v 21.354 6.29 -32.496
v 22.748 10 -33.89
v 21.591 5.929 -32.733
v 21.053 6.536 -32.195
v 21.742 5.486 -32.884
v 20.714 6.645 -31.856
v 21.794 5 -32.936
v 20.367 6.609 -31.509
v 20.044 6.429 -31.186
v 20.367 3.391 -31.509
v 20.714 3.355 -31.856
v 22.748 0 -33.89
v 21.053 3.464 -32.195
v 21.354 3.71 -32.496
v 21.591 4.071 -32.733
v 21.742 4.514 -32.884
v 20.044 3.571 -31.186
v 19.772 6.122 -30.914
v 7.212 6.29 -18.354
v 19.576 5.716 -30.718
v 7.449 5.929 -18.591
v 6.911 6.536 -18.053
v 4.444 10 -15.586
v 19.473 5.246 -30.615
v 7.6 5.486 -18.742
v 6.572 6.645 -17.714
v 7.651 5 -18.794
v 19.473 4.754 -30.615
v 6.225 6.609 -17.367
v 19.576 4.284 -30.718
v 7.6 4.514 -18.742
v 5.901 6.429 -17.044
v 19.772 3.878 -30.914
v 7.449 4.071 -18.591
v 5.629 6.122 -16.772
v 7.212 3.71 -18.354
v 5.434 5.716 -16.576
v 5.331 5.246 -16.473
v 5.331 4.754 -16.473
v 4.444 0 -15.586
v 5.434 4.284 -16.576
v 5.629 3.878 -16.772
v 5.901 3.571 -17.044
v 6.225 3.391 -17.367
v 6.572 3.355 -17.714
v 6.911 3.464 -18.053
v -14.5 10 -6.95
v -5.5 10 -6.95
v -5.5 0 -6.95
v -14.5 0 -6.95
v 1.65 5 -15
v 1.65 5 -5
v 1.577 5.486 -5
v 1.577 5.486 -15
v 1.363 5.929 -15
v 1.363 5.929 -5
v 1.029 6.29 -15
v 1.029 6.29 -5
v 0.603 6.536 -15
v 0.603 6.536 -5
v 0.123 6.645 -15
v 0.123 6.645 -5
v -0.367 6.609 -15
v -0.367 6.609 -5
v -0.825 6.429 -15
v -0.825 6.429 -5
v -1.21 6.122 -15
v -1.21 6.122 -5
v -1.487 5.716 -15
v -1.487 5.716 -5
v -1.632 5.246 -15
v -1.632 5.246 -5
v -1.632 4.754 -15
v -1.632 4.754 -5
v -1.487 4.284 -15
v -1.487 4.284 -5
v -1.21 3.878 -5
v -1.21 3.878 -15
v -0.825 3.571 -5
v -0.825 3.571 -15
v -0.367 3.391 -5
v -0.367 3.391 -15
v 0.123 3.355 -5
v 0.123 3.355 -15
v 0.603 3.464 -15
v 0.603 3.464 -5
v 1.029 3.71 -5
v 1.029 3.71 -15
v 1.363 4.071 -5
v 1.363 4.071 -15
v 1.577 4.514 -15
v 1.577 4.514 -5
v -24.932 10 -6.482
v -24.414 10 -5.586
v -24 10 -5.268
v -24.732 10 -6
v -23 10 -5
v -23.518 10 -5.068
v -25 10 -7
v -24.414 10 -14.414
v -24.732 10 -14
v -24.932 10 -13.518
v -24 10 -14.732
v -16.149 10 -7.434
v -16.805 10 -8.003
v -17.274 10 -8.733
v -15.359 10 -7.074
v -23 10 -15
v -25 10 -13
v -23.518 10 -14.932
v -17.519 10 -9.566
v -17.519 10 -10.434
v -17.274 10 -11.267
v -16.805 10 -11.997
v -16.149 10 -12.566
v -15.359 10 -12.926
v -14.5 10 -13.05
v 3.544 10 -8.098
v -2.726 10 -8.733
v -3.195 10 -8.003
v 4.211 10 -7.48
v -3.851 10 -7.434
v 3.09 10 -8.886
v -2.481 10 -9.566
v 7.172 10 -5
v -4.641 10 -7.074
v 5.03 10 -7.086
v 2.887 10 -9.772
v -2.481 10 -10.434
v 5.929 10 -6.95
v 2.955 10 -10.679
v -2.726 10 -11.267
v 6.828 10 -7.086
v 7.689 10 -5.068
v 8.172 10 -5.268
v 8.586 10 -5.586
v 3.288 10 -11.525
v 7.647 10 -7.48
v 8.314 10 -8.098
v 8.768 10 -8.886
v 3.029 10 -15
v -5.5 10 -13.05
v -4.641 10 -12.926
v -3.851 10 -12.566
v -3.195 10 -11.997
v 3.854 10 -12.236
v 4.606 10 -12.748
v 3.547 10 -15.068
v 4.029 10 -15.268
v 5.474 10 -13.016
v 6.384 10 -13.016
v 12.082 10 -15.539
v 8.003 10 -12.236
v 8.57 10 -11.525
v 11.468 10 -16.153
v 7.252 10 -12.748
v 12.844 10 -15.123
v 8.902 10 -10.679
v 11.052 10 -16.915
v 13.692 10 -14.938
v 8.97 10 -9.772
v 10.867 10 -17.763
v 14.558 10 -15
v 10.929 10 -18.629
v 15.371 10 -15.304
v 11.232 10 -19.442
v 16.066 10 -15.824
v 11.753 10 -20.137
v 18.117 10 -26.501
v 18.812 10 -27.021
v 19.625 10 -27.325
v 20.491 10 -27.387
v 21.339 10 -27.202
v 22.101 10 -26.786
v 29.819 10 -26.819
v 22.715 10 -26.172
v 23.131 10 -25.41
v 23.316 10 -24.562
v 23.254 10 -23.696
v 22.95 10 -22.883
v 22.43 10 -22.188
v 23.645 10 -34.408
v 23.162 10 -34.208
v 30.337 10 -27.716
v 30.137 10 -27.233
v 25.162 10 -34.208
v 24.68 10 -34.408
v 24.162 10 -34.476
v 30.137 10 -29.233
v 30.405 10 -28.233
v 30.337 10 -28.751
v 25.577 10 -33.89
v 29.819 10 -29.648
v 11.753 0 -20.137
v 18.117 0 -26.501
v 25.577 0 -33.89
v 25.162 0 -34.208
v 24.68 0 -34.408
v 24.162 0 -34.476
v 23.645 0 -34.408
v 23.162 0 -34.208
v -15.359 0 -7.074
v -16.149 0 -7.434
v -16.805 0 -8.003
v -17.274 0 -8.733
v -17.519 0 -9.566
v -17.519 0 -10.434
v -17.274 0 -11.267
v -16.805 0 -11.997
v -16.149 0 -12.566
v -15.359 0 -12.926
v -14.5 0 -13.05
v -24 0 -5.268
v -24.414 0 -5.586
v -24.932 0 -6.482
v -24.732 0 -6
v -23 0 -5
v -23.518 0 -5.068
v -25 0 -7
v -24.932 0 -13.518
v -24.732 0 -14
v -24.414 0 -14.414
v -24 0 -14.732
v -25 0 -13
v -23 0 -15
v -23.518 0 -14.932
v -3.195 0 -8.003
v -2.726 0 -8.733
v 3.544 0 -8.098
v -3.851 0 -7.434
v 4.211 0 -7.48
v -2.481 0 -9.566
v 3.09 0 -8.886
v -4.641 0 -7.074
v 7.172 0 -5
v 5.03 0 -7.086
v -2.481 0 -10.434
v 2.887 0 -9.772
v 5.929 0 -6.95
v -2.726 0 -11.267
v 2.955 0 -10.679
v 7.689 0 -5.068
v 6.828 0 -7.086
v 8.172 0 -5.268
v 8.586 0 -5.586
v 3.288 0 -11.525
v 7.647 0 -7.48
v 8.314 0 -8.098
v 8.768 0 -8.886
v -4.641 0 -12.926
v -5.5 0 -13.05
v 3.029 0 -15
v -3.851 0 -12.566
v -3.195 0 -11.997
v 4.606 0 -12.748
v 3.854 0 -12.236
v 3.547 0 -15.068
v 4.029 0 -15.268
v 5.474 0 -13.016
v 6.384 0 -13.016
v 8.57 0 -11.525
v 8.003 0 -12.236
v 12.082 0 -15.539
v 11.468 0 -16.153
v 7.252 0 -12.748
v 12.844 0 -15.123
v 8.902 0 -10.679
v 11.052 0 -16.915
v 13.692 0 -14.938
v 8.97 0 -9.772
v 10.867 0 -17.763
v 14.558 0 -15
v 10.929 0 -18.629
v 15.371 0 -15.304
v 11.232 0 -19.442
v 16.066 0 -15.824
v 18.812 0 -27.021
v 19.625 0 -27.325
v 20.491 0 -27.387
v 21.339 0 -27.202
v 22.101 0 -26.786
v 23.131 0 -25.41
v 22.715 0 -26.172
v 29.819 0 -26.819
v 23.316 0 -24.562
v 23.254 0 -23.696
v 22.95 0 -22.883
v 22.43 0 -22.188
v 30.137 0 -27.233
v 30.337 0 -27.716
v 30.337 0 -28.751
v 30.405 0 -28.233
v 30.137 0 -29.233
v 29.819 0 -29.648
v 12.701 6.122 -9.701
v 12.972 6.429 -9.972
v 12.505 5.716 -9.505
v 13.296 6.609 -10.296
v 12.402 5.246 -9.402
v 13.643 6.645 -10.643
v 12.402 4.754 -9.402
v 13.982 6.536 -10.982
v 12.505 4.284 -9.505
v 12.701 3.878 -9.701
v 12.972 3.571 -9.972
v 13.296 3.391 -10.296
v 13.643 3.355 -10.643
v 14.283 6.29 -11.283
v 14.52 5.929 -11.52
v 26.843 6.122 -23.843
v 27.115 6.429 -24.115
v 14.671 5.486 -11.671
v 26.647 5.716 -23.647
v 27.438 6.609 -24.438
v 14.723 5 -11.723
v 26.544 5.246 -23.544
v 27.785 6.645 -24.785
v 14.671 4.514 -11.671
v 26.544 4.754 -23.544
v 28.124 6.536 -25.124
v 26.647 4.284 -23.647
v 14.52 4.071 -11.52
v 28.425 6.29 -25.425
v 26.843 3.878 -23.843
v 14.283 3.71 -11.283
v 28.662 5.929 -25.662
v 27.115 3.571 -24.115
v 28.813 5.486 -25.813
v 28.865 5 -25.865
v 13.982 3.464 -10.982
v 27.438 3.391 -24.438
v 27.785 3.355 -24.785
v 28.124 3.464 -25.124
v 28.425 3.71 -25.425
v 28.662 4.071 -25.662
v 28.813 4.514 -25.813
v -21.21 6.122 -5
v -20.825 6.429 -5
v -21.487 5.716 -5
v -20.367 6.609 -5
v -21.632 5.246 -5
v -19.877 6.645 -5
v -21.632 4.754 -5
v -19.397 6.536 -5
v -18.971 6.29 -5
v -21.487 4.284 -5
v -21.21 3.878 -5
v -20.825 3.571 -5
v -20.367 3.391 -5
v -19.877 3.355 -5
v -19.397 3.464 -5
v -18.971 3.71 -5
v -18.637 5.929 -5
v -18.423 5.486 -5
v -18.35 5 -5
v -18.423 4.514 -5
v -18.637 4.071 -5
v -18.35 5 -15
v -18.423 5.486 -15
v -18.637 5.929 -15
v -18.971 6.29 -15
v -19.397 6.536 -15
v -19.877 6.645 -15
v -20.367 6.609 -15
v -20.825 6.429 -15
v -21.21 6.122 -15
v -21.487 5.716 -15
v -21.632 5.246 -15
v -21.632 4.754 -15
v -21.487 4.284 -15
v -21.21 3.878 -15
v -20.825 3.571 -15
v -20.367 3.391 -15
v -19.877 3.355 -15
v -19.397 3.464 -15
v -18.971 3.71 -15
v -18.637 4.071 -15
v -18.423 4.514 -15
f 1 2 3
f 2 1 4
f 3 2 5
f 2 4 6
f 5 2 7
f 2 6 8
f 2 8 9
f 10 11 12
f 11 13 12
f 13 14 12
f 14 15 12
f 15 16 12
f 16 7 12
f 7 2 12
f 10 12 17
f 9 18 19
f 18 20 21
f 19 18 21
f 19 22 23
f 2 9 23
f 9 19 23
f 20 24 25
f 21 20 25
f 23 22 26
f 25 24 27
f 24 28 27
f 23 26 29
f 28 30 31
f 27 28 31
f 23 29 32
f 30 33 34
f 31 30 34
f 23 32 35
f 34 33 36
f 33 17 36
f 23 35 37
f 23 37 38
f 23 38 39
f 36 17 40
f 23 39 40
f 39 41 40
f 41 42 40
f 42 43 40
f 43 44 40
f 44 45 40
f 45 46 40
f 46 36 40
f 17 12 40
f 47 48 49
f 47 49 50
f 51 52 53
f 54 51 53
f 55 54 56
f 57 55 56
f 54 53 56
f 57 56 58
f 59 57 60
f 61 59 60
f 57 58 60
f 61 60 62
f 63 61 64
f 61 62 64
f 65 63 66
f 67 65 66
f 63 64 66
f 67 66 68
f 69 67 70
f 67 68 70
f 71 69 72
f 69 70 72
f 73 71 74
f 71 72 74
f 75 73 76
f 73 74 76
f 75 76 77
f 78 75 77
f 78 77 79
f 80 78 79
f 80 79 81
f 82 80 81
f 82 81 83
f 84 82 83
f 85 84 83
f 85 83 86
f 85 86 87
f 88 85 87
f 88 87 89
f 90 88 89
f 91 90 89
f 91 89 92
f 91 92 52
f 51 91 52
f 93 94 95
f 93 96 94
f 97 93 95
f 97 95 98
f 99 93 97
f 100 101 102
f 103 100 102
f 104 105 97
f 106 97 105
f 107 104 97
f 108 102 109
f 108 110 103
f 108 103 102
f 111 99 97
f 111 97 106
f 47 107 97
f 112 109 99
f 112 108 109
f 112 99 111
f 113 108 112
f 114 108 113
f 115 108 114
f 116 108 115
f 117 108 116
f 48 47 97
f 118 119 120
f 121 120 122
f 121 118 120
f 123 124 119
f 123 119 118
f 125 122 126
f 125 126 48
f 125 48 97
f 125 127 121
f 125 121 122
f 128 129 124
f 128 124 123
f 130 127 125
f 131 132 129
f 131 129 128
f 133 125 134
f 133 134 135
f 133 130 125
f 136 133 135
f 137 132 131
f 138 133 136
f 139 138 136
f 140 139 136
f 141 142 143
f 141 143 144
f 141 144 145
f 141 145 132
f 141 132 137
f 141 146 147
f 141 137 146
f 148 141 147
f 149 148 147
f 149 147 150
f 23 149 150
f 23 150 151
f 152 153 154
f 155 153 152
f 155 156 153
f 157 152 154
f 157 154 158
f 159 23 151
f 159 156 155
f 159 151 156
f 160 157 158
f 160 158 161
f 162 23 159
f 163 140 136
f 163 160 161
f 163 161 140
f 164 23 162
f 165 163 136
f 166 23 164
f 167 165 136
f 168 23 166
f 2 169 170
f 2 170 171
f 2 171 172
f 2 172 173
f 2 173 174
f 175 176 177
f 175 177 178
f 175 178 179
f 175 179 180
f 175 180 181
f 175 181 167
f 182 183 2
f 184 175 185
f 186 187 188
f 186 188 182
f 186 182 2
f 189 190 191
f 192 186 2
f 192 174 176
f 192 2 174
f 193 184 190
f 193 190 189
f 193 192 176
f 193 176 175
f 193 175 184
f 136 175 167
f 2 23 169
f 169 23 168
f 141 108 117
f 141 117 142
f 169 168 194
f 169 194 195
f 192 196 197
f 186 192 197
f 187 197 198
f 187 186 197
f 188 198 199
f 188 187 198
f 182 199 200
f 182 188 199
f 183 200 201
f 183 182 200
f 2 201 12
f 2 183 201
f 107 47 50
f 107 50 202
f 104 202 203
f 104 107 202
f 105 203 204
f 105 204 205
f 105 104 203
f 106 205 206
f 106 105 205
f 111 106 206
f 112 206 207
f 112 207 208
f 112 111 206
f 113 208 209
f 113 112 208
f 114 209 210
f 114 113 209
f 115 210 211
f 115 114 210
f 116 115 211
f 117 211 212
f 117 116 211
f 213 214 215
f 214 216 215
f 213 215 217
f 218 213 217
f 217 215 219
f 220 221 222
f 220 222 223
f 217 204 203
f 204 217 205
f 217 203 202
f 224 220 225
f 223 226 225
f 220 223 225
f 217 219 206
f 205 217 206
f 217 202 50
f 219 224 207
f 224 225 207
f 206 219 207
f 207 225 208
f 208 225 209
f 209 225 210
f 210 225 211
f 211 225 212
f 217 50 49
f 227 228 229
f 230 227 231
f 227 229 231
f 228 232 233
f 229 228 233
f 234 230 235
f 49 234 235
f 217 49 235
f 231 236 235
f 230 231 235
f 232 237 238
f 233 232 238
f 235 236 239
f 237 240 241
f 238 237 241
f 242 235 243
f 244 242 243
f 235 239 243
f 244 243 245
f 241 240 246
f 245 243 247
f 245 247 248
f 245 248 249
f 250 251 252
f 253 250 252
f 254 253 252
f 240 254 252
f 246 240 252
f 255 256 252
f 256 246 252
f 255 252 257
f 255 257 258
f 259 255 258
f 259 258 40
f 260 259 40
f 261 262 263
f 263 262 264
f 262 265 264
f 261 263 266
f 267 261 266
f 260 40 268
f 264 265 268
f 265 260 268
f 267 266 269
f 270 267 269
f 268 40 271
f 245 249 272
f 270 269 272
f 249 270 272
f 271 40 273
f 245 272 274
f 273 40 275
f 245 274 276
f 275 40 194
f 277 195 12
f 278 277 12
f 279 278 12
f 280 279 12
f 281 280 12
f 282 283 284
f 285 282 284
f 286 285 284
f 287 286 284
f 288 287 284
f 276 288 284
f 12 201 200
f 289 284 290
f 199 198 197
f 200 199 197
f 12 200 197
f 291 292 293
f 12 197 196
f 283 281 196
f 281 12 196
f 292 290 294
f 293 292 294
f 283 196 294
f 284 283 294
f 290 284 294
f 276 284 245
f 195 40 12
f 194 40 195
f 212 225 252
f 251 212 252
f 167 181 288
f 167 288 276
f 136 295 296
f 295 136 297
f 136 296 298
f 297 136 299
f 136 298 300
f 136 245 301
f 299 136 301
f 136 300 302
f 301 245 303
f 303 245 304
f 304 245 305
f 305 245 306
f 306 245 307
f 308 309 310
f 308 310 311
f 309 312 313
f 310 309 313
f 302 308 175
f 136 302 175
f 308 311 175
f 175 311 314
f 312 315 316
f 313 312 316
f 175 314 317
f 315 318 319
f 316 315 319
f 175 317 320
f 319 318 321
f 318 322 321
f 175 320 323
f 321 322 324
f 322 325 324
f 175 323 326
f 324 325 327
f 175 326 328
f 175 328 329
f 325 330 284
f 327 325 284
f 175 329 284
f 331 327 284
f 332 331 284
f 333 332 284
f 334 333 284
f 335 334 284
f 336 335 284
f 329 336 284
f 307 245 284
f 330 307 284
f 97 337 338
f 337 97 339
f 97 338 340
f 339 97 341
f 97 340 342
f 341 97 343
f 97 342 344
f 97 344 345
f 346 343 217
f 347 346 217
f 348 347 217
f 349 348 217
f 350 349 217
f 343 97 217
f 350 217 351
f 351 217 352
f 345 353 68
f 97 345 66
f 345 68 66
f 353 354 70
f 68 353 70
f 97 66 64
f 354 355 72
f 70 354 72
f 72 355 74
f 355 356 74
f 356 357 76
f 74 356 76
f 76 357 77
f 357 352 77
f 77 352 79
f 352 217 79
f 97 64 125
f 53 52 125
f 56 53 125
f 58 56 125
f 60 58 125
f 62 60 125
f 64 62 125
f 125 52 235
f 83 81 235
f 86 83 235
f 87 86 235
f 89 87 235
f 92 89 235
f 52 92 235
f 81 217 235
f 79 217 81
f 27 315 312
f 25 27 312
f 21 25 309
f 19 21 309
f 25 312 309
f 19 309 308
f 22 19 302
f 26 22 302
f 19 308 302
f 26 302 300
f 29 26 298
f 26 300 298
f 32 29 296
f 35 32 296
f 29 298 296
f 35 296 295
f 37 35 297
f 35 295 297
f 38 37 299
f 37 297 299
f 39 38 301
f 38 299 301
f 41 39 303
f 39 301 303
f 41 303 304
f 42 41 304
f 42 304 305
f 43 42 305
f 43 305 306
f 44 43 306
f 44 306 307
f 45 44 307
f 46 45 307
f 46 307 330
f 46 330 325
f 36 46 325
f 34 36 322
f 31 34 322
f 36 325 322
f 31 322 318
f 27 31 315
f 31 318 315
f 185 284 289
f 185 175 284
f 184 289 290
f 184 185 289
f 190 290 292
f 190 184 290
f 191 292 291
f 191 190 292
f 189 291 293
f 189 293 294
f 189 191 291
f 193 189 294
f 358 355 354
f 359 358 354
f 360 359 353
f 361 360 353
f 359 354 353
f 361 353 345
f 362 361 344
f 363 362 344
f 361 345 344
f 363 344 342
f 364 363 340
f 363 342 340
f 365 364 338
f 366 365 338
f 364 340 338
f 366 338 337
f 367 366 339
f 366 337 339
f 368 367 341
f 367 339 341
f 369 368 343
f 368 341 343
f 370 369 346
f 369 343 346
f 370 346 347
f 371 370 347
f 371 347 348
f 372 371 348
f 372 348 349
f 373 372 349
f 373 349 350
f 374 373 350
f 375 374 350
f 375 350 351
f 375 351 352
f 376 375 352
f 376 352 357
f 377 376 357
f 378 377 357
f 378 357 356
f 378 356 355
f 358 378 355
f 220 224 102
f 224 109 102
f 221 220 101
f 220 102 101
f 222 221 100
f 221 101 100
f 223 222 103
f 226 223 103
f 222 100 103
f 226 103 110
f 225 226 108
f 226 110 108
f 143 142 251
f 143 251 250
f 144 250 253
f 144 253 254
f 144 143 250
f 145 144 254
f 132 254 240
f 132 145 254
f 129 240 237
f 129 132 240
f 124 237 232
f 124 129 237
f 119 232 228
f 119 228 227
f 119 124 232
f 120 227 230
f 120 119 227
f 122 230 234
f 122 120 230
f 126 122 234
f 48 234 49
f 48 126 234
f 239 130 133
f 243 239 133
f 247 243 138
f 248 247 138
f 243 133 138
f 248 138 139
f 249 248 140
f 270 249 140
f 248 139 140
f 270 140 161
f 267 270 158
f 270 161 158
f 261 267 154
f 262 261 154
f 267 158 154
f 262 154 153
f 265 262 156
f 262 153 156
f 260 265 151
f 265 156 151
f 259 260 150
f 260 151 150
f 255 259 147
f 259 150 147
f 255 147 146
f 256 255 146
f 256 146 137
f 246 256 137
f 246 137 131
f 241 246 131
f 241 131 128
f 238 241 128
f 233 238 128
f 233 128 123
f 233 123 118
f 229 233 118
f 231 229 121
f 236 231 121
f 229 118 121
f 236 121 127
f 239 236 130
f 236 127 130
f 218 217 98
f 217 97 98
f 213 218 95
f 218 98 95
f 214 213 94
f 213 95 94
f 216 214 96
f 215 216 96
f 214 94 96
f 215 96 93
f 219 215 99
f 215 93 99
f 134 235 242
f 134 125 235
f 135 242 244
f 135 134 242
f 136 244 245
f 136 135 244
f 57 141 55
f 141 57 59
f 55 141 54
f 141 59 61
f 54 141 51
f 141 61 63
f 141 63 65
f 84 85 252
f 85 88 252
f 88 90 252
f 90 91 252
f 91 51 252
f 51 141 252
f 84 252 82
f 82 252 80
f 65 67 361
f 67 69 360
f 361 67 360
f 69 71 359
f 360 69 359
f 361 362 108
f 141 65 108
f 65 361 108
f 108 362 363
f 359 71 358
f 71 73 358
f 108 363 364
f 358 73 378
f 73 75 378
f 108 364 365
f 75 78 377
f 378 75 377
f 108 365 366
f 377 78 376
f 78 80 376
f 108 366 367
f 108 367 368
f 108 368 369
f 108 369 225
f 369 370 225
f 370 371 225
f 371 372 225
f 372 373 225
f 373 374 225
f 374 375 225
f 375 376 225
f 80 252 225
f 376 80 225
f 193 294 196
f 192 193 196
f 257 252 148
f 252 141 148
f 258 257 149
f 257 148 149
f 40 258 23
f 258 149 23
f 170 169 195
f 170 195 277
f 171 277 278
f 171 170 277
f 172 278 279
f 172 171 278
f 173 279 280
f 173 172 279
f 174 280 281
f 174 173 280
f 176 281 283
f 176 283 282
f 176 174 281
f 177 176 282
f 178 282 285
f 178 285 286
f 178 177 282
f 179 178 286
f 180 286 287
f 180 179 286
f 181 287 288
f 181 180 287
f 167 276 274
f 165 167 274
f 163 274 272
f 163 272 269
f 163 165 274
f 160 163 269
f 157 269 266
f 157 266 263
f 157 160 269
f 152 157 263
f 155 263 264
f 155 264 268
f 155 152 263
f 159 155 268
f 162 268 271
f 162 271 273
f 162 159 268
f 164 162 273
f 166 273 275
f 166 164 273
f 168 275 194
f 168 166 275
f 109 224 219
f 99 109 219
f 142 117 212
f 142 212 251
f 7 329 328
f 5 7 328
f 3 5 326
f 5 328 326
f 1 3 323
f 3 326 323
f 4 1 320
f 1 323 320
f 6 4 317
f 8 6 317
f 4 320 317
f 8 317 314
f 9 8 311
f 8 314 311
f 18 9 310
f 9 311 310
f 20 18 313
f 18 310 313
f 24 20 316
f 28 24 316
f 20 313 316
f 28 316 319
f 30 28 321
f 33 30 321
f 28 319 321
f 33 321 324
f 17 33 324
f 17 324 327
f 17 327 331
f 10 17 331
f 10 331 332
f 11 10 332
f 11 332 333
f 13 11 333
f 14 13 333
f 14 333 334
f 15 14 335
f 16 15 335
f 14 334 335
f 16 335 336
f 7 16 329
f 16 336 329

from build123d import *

# Parameters (mm, degrees)
EXTRUDE_1_DEPTH     = 10
SKETCH_2_R          = 1.65
CUT_EXTRUDE_1_DEPTH = 45.653083029
SKETCH_4_R          = 1.65
CUT_EXTRUDE_3_DEPTH = 10
SKETCH_5_R          = 3.05
CUT_EXTRUDE_4_DEPTH = 10
FILLET_2_R          = 2


with BuildPart() as part:
    # ｽｹｯﾁ1 → ﾎﾞｽ - 押し出し1 (new body)
    with BuildSketch(Plane(origin=(0, 0, 0), x_dir=(1, 0, 0), z_dir=(0, 1, 0))):
        Polygon((-25, 5), (8, 5), (31.233495706, 28.233495706), (24.162427894, 35.304563517), (3.857864376, 15), (-25, 15), align=None)
    extrude(amount=EXTRUDE_1_DEPTH)

    # ｽｹｯﾁ2 → ｶｯﾄ - 押し出し1 (cut, through all)
    with BuildSketch(Plane.XY.offset(-5)):
        with Locations((-20, 5)):
            Circle(SKETCH_2_R)
        with Locations((0, 5)):
            Circle(SKETCH_2_R)
    extrude(amount=-CUT_EXTRUDE_1_DEPTH, mode=Mode.SUBTRACT)

    # ｽｹｯﾁ4 → ｶｯﾄ - 押し出し3 (cut)
    with BuildSketch(Plane(origin=(1.5, 0, 1.5), x_dir=(0.7071067811865472, 0, -0.7071067811865479), z_dir=(0.7071067811865479, 0, 0.7071067811865472))):
        with Locations((37.049512883, 5)):
            Circle(SKETCH_4_R)
        with Locations((17.049512883, 5)):
            Circle(SKETCH_4_R)
    extrude(amount=-CUT_EXTRUDE_3_DEPTH, mode=Mode.SUBTRACT)

    # ｽｹｯﾁ5 → ｶｯﾄ - 押し出し4 (cut)
    with BuildSketch(Plane(origin=(0, 10, 0), x_dir=(1, 0, 0), z_dir=(0, 1, 0))):
        with Locations(Location((5.928932188, 10, 0), (0, 0, 270))):
            Circle(SKETCH_5_R)
        with BuildLine():
            Line((-14.5, 13.05), (-5.5, 13.05))
            ThreePointArc((-5.5, 13.05), (-2.45, 10), (-5.5, 6.95))
            Line((-5.5, 6.95), (-14.5, 6.95))
            ThreePointArc((-14.5, 6.95), (-17.55, 10), (-14.5, 13.05))
        make_face()
        with BuildLine():
            Line((22.43001628, 22.187732726), (16.066055249, 15.823771696))
            ThreePointArc((16.066055249, 15.823771696), (11.752703884, 15.823771696), (11.752703884, 20.137123061))
            Line((11.752703884, 20.137123061), (18.116664914, 26.501084092))
            ThreePointArc((18.116664914, 26.501084092), (22.43001628, 26.501084092), (22.43001628, 22.187732726))
        make_face()
    extrude(amount=-CUT_EXTRUDE_4_DEPTH, mode=Mode.SUBTRACT)

    # ﾌｨﾚｯﾄ2
    fillet_2_edges = [part.edges().sort_by_distance(p)[0] for p in [
        (-25, 5, -15),
        (3.857864376, 5, -15),
        (24.162427894, 5, -35.304563517),
        (31.233495706, 5, -28.233495706),
        (8, 5, -5),
        (-25, 5, -5),
    ]]
    fillet(fillet_2_edges, radius=FILLET_2_R)


solid = part.part
